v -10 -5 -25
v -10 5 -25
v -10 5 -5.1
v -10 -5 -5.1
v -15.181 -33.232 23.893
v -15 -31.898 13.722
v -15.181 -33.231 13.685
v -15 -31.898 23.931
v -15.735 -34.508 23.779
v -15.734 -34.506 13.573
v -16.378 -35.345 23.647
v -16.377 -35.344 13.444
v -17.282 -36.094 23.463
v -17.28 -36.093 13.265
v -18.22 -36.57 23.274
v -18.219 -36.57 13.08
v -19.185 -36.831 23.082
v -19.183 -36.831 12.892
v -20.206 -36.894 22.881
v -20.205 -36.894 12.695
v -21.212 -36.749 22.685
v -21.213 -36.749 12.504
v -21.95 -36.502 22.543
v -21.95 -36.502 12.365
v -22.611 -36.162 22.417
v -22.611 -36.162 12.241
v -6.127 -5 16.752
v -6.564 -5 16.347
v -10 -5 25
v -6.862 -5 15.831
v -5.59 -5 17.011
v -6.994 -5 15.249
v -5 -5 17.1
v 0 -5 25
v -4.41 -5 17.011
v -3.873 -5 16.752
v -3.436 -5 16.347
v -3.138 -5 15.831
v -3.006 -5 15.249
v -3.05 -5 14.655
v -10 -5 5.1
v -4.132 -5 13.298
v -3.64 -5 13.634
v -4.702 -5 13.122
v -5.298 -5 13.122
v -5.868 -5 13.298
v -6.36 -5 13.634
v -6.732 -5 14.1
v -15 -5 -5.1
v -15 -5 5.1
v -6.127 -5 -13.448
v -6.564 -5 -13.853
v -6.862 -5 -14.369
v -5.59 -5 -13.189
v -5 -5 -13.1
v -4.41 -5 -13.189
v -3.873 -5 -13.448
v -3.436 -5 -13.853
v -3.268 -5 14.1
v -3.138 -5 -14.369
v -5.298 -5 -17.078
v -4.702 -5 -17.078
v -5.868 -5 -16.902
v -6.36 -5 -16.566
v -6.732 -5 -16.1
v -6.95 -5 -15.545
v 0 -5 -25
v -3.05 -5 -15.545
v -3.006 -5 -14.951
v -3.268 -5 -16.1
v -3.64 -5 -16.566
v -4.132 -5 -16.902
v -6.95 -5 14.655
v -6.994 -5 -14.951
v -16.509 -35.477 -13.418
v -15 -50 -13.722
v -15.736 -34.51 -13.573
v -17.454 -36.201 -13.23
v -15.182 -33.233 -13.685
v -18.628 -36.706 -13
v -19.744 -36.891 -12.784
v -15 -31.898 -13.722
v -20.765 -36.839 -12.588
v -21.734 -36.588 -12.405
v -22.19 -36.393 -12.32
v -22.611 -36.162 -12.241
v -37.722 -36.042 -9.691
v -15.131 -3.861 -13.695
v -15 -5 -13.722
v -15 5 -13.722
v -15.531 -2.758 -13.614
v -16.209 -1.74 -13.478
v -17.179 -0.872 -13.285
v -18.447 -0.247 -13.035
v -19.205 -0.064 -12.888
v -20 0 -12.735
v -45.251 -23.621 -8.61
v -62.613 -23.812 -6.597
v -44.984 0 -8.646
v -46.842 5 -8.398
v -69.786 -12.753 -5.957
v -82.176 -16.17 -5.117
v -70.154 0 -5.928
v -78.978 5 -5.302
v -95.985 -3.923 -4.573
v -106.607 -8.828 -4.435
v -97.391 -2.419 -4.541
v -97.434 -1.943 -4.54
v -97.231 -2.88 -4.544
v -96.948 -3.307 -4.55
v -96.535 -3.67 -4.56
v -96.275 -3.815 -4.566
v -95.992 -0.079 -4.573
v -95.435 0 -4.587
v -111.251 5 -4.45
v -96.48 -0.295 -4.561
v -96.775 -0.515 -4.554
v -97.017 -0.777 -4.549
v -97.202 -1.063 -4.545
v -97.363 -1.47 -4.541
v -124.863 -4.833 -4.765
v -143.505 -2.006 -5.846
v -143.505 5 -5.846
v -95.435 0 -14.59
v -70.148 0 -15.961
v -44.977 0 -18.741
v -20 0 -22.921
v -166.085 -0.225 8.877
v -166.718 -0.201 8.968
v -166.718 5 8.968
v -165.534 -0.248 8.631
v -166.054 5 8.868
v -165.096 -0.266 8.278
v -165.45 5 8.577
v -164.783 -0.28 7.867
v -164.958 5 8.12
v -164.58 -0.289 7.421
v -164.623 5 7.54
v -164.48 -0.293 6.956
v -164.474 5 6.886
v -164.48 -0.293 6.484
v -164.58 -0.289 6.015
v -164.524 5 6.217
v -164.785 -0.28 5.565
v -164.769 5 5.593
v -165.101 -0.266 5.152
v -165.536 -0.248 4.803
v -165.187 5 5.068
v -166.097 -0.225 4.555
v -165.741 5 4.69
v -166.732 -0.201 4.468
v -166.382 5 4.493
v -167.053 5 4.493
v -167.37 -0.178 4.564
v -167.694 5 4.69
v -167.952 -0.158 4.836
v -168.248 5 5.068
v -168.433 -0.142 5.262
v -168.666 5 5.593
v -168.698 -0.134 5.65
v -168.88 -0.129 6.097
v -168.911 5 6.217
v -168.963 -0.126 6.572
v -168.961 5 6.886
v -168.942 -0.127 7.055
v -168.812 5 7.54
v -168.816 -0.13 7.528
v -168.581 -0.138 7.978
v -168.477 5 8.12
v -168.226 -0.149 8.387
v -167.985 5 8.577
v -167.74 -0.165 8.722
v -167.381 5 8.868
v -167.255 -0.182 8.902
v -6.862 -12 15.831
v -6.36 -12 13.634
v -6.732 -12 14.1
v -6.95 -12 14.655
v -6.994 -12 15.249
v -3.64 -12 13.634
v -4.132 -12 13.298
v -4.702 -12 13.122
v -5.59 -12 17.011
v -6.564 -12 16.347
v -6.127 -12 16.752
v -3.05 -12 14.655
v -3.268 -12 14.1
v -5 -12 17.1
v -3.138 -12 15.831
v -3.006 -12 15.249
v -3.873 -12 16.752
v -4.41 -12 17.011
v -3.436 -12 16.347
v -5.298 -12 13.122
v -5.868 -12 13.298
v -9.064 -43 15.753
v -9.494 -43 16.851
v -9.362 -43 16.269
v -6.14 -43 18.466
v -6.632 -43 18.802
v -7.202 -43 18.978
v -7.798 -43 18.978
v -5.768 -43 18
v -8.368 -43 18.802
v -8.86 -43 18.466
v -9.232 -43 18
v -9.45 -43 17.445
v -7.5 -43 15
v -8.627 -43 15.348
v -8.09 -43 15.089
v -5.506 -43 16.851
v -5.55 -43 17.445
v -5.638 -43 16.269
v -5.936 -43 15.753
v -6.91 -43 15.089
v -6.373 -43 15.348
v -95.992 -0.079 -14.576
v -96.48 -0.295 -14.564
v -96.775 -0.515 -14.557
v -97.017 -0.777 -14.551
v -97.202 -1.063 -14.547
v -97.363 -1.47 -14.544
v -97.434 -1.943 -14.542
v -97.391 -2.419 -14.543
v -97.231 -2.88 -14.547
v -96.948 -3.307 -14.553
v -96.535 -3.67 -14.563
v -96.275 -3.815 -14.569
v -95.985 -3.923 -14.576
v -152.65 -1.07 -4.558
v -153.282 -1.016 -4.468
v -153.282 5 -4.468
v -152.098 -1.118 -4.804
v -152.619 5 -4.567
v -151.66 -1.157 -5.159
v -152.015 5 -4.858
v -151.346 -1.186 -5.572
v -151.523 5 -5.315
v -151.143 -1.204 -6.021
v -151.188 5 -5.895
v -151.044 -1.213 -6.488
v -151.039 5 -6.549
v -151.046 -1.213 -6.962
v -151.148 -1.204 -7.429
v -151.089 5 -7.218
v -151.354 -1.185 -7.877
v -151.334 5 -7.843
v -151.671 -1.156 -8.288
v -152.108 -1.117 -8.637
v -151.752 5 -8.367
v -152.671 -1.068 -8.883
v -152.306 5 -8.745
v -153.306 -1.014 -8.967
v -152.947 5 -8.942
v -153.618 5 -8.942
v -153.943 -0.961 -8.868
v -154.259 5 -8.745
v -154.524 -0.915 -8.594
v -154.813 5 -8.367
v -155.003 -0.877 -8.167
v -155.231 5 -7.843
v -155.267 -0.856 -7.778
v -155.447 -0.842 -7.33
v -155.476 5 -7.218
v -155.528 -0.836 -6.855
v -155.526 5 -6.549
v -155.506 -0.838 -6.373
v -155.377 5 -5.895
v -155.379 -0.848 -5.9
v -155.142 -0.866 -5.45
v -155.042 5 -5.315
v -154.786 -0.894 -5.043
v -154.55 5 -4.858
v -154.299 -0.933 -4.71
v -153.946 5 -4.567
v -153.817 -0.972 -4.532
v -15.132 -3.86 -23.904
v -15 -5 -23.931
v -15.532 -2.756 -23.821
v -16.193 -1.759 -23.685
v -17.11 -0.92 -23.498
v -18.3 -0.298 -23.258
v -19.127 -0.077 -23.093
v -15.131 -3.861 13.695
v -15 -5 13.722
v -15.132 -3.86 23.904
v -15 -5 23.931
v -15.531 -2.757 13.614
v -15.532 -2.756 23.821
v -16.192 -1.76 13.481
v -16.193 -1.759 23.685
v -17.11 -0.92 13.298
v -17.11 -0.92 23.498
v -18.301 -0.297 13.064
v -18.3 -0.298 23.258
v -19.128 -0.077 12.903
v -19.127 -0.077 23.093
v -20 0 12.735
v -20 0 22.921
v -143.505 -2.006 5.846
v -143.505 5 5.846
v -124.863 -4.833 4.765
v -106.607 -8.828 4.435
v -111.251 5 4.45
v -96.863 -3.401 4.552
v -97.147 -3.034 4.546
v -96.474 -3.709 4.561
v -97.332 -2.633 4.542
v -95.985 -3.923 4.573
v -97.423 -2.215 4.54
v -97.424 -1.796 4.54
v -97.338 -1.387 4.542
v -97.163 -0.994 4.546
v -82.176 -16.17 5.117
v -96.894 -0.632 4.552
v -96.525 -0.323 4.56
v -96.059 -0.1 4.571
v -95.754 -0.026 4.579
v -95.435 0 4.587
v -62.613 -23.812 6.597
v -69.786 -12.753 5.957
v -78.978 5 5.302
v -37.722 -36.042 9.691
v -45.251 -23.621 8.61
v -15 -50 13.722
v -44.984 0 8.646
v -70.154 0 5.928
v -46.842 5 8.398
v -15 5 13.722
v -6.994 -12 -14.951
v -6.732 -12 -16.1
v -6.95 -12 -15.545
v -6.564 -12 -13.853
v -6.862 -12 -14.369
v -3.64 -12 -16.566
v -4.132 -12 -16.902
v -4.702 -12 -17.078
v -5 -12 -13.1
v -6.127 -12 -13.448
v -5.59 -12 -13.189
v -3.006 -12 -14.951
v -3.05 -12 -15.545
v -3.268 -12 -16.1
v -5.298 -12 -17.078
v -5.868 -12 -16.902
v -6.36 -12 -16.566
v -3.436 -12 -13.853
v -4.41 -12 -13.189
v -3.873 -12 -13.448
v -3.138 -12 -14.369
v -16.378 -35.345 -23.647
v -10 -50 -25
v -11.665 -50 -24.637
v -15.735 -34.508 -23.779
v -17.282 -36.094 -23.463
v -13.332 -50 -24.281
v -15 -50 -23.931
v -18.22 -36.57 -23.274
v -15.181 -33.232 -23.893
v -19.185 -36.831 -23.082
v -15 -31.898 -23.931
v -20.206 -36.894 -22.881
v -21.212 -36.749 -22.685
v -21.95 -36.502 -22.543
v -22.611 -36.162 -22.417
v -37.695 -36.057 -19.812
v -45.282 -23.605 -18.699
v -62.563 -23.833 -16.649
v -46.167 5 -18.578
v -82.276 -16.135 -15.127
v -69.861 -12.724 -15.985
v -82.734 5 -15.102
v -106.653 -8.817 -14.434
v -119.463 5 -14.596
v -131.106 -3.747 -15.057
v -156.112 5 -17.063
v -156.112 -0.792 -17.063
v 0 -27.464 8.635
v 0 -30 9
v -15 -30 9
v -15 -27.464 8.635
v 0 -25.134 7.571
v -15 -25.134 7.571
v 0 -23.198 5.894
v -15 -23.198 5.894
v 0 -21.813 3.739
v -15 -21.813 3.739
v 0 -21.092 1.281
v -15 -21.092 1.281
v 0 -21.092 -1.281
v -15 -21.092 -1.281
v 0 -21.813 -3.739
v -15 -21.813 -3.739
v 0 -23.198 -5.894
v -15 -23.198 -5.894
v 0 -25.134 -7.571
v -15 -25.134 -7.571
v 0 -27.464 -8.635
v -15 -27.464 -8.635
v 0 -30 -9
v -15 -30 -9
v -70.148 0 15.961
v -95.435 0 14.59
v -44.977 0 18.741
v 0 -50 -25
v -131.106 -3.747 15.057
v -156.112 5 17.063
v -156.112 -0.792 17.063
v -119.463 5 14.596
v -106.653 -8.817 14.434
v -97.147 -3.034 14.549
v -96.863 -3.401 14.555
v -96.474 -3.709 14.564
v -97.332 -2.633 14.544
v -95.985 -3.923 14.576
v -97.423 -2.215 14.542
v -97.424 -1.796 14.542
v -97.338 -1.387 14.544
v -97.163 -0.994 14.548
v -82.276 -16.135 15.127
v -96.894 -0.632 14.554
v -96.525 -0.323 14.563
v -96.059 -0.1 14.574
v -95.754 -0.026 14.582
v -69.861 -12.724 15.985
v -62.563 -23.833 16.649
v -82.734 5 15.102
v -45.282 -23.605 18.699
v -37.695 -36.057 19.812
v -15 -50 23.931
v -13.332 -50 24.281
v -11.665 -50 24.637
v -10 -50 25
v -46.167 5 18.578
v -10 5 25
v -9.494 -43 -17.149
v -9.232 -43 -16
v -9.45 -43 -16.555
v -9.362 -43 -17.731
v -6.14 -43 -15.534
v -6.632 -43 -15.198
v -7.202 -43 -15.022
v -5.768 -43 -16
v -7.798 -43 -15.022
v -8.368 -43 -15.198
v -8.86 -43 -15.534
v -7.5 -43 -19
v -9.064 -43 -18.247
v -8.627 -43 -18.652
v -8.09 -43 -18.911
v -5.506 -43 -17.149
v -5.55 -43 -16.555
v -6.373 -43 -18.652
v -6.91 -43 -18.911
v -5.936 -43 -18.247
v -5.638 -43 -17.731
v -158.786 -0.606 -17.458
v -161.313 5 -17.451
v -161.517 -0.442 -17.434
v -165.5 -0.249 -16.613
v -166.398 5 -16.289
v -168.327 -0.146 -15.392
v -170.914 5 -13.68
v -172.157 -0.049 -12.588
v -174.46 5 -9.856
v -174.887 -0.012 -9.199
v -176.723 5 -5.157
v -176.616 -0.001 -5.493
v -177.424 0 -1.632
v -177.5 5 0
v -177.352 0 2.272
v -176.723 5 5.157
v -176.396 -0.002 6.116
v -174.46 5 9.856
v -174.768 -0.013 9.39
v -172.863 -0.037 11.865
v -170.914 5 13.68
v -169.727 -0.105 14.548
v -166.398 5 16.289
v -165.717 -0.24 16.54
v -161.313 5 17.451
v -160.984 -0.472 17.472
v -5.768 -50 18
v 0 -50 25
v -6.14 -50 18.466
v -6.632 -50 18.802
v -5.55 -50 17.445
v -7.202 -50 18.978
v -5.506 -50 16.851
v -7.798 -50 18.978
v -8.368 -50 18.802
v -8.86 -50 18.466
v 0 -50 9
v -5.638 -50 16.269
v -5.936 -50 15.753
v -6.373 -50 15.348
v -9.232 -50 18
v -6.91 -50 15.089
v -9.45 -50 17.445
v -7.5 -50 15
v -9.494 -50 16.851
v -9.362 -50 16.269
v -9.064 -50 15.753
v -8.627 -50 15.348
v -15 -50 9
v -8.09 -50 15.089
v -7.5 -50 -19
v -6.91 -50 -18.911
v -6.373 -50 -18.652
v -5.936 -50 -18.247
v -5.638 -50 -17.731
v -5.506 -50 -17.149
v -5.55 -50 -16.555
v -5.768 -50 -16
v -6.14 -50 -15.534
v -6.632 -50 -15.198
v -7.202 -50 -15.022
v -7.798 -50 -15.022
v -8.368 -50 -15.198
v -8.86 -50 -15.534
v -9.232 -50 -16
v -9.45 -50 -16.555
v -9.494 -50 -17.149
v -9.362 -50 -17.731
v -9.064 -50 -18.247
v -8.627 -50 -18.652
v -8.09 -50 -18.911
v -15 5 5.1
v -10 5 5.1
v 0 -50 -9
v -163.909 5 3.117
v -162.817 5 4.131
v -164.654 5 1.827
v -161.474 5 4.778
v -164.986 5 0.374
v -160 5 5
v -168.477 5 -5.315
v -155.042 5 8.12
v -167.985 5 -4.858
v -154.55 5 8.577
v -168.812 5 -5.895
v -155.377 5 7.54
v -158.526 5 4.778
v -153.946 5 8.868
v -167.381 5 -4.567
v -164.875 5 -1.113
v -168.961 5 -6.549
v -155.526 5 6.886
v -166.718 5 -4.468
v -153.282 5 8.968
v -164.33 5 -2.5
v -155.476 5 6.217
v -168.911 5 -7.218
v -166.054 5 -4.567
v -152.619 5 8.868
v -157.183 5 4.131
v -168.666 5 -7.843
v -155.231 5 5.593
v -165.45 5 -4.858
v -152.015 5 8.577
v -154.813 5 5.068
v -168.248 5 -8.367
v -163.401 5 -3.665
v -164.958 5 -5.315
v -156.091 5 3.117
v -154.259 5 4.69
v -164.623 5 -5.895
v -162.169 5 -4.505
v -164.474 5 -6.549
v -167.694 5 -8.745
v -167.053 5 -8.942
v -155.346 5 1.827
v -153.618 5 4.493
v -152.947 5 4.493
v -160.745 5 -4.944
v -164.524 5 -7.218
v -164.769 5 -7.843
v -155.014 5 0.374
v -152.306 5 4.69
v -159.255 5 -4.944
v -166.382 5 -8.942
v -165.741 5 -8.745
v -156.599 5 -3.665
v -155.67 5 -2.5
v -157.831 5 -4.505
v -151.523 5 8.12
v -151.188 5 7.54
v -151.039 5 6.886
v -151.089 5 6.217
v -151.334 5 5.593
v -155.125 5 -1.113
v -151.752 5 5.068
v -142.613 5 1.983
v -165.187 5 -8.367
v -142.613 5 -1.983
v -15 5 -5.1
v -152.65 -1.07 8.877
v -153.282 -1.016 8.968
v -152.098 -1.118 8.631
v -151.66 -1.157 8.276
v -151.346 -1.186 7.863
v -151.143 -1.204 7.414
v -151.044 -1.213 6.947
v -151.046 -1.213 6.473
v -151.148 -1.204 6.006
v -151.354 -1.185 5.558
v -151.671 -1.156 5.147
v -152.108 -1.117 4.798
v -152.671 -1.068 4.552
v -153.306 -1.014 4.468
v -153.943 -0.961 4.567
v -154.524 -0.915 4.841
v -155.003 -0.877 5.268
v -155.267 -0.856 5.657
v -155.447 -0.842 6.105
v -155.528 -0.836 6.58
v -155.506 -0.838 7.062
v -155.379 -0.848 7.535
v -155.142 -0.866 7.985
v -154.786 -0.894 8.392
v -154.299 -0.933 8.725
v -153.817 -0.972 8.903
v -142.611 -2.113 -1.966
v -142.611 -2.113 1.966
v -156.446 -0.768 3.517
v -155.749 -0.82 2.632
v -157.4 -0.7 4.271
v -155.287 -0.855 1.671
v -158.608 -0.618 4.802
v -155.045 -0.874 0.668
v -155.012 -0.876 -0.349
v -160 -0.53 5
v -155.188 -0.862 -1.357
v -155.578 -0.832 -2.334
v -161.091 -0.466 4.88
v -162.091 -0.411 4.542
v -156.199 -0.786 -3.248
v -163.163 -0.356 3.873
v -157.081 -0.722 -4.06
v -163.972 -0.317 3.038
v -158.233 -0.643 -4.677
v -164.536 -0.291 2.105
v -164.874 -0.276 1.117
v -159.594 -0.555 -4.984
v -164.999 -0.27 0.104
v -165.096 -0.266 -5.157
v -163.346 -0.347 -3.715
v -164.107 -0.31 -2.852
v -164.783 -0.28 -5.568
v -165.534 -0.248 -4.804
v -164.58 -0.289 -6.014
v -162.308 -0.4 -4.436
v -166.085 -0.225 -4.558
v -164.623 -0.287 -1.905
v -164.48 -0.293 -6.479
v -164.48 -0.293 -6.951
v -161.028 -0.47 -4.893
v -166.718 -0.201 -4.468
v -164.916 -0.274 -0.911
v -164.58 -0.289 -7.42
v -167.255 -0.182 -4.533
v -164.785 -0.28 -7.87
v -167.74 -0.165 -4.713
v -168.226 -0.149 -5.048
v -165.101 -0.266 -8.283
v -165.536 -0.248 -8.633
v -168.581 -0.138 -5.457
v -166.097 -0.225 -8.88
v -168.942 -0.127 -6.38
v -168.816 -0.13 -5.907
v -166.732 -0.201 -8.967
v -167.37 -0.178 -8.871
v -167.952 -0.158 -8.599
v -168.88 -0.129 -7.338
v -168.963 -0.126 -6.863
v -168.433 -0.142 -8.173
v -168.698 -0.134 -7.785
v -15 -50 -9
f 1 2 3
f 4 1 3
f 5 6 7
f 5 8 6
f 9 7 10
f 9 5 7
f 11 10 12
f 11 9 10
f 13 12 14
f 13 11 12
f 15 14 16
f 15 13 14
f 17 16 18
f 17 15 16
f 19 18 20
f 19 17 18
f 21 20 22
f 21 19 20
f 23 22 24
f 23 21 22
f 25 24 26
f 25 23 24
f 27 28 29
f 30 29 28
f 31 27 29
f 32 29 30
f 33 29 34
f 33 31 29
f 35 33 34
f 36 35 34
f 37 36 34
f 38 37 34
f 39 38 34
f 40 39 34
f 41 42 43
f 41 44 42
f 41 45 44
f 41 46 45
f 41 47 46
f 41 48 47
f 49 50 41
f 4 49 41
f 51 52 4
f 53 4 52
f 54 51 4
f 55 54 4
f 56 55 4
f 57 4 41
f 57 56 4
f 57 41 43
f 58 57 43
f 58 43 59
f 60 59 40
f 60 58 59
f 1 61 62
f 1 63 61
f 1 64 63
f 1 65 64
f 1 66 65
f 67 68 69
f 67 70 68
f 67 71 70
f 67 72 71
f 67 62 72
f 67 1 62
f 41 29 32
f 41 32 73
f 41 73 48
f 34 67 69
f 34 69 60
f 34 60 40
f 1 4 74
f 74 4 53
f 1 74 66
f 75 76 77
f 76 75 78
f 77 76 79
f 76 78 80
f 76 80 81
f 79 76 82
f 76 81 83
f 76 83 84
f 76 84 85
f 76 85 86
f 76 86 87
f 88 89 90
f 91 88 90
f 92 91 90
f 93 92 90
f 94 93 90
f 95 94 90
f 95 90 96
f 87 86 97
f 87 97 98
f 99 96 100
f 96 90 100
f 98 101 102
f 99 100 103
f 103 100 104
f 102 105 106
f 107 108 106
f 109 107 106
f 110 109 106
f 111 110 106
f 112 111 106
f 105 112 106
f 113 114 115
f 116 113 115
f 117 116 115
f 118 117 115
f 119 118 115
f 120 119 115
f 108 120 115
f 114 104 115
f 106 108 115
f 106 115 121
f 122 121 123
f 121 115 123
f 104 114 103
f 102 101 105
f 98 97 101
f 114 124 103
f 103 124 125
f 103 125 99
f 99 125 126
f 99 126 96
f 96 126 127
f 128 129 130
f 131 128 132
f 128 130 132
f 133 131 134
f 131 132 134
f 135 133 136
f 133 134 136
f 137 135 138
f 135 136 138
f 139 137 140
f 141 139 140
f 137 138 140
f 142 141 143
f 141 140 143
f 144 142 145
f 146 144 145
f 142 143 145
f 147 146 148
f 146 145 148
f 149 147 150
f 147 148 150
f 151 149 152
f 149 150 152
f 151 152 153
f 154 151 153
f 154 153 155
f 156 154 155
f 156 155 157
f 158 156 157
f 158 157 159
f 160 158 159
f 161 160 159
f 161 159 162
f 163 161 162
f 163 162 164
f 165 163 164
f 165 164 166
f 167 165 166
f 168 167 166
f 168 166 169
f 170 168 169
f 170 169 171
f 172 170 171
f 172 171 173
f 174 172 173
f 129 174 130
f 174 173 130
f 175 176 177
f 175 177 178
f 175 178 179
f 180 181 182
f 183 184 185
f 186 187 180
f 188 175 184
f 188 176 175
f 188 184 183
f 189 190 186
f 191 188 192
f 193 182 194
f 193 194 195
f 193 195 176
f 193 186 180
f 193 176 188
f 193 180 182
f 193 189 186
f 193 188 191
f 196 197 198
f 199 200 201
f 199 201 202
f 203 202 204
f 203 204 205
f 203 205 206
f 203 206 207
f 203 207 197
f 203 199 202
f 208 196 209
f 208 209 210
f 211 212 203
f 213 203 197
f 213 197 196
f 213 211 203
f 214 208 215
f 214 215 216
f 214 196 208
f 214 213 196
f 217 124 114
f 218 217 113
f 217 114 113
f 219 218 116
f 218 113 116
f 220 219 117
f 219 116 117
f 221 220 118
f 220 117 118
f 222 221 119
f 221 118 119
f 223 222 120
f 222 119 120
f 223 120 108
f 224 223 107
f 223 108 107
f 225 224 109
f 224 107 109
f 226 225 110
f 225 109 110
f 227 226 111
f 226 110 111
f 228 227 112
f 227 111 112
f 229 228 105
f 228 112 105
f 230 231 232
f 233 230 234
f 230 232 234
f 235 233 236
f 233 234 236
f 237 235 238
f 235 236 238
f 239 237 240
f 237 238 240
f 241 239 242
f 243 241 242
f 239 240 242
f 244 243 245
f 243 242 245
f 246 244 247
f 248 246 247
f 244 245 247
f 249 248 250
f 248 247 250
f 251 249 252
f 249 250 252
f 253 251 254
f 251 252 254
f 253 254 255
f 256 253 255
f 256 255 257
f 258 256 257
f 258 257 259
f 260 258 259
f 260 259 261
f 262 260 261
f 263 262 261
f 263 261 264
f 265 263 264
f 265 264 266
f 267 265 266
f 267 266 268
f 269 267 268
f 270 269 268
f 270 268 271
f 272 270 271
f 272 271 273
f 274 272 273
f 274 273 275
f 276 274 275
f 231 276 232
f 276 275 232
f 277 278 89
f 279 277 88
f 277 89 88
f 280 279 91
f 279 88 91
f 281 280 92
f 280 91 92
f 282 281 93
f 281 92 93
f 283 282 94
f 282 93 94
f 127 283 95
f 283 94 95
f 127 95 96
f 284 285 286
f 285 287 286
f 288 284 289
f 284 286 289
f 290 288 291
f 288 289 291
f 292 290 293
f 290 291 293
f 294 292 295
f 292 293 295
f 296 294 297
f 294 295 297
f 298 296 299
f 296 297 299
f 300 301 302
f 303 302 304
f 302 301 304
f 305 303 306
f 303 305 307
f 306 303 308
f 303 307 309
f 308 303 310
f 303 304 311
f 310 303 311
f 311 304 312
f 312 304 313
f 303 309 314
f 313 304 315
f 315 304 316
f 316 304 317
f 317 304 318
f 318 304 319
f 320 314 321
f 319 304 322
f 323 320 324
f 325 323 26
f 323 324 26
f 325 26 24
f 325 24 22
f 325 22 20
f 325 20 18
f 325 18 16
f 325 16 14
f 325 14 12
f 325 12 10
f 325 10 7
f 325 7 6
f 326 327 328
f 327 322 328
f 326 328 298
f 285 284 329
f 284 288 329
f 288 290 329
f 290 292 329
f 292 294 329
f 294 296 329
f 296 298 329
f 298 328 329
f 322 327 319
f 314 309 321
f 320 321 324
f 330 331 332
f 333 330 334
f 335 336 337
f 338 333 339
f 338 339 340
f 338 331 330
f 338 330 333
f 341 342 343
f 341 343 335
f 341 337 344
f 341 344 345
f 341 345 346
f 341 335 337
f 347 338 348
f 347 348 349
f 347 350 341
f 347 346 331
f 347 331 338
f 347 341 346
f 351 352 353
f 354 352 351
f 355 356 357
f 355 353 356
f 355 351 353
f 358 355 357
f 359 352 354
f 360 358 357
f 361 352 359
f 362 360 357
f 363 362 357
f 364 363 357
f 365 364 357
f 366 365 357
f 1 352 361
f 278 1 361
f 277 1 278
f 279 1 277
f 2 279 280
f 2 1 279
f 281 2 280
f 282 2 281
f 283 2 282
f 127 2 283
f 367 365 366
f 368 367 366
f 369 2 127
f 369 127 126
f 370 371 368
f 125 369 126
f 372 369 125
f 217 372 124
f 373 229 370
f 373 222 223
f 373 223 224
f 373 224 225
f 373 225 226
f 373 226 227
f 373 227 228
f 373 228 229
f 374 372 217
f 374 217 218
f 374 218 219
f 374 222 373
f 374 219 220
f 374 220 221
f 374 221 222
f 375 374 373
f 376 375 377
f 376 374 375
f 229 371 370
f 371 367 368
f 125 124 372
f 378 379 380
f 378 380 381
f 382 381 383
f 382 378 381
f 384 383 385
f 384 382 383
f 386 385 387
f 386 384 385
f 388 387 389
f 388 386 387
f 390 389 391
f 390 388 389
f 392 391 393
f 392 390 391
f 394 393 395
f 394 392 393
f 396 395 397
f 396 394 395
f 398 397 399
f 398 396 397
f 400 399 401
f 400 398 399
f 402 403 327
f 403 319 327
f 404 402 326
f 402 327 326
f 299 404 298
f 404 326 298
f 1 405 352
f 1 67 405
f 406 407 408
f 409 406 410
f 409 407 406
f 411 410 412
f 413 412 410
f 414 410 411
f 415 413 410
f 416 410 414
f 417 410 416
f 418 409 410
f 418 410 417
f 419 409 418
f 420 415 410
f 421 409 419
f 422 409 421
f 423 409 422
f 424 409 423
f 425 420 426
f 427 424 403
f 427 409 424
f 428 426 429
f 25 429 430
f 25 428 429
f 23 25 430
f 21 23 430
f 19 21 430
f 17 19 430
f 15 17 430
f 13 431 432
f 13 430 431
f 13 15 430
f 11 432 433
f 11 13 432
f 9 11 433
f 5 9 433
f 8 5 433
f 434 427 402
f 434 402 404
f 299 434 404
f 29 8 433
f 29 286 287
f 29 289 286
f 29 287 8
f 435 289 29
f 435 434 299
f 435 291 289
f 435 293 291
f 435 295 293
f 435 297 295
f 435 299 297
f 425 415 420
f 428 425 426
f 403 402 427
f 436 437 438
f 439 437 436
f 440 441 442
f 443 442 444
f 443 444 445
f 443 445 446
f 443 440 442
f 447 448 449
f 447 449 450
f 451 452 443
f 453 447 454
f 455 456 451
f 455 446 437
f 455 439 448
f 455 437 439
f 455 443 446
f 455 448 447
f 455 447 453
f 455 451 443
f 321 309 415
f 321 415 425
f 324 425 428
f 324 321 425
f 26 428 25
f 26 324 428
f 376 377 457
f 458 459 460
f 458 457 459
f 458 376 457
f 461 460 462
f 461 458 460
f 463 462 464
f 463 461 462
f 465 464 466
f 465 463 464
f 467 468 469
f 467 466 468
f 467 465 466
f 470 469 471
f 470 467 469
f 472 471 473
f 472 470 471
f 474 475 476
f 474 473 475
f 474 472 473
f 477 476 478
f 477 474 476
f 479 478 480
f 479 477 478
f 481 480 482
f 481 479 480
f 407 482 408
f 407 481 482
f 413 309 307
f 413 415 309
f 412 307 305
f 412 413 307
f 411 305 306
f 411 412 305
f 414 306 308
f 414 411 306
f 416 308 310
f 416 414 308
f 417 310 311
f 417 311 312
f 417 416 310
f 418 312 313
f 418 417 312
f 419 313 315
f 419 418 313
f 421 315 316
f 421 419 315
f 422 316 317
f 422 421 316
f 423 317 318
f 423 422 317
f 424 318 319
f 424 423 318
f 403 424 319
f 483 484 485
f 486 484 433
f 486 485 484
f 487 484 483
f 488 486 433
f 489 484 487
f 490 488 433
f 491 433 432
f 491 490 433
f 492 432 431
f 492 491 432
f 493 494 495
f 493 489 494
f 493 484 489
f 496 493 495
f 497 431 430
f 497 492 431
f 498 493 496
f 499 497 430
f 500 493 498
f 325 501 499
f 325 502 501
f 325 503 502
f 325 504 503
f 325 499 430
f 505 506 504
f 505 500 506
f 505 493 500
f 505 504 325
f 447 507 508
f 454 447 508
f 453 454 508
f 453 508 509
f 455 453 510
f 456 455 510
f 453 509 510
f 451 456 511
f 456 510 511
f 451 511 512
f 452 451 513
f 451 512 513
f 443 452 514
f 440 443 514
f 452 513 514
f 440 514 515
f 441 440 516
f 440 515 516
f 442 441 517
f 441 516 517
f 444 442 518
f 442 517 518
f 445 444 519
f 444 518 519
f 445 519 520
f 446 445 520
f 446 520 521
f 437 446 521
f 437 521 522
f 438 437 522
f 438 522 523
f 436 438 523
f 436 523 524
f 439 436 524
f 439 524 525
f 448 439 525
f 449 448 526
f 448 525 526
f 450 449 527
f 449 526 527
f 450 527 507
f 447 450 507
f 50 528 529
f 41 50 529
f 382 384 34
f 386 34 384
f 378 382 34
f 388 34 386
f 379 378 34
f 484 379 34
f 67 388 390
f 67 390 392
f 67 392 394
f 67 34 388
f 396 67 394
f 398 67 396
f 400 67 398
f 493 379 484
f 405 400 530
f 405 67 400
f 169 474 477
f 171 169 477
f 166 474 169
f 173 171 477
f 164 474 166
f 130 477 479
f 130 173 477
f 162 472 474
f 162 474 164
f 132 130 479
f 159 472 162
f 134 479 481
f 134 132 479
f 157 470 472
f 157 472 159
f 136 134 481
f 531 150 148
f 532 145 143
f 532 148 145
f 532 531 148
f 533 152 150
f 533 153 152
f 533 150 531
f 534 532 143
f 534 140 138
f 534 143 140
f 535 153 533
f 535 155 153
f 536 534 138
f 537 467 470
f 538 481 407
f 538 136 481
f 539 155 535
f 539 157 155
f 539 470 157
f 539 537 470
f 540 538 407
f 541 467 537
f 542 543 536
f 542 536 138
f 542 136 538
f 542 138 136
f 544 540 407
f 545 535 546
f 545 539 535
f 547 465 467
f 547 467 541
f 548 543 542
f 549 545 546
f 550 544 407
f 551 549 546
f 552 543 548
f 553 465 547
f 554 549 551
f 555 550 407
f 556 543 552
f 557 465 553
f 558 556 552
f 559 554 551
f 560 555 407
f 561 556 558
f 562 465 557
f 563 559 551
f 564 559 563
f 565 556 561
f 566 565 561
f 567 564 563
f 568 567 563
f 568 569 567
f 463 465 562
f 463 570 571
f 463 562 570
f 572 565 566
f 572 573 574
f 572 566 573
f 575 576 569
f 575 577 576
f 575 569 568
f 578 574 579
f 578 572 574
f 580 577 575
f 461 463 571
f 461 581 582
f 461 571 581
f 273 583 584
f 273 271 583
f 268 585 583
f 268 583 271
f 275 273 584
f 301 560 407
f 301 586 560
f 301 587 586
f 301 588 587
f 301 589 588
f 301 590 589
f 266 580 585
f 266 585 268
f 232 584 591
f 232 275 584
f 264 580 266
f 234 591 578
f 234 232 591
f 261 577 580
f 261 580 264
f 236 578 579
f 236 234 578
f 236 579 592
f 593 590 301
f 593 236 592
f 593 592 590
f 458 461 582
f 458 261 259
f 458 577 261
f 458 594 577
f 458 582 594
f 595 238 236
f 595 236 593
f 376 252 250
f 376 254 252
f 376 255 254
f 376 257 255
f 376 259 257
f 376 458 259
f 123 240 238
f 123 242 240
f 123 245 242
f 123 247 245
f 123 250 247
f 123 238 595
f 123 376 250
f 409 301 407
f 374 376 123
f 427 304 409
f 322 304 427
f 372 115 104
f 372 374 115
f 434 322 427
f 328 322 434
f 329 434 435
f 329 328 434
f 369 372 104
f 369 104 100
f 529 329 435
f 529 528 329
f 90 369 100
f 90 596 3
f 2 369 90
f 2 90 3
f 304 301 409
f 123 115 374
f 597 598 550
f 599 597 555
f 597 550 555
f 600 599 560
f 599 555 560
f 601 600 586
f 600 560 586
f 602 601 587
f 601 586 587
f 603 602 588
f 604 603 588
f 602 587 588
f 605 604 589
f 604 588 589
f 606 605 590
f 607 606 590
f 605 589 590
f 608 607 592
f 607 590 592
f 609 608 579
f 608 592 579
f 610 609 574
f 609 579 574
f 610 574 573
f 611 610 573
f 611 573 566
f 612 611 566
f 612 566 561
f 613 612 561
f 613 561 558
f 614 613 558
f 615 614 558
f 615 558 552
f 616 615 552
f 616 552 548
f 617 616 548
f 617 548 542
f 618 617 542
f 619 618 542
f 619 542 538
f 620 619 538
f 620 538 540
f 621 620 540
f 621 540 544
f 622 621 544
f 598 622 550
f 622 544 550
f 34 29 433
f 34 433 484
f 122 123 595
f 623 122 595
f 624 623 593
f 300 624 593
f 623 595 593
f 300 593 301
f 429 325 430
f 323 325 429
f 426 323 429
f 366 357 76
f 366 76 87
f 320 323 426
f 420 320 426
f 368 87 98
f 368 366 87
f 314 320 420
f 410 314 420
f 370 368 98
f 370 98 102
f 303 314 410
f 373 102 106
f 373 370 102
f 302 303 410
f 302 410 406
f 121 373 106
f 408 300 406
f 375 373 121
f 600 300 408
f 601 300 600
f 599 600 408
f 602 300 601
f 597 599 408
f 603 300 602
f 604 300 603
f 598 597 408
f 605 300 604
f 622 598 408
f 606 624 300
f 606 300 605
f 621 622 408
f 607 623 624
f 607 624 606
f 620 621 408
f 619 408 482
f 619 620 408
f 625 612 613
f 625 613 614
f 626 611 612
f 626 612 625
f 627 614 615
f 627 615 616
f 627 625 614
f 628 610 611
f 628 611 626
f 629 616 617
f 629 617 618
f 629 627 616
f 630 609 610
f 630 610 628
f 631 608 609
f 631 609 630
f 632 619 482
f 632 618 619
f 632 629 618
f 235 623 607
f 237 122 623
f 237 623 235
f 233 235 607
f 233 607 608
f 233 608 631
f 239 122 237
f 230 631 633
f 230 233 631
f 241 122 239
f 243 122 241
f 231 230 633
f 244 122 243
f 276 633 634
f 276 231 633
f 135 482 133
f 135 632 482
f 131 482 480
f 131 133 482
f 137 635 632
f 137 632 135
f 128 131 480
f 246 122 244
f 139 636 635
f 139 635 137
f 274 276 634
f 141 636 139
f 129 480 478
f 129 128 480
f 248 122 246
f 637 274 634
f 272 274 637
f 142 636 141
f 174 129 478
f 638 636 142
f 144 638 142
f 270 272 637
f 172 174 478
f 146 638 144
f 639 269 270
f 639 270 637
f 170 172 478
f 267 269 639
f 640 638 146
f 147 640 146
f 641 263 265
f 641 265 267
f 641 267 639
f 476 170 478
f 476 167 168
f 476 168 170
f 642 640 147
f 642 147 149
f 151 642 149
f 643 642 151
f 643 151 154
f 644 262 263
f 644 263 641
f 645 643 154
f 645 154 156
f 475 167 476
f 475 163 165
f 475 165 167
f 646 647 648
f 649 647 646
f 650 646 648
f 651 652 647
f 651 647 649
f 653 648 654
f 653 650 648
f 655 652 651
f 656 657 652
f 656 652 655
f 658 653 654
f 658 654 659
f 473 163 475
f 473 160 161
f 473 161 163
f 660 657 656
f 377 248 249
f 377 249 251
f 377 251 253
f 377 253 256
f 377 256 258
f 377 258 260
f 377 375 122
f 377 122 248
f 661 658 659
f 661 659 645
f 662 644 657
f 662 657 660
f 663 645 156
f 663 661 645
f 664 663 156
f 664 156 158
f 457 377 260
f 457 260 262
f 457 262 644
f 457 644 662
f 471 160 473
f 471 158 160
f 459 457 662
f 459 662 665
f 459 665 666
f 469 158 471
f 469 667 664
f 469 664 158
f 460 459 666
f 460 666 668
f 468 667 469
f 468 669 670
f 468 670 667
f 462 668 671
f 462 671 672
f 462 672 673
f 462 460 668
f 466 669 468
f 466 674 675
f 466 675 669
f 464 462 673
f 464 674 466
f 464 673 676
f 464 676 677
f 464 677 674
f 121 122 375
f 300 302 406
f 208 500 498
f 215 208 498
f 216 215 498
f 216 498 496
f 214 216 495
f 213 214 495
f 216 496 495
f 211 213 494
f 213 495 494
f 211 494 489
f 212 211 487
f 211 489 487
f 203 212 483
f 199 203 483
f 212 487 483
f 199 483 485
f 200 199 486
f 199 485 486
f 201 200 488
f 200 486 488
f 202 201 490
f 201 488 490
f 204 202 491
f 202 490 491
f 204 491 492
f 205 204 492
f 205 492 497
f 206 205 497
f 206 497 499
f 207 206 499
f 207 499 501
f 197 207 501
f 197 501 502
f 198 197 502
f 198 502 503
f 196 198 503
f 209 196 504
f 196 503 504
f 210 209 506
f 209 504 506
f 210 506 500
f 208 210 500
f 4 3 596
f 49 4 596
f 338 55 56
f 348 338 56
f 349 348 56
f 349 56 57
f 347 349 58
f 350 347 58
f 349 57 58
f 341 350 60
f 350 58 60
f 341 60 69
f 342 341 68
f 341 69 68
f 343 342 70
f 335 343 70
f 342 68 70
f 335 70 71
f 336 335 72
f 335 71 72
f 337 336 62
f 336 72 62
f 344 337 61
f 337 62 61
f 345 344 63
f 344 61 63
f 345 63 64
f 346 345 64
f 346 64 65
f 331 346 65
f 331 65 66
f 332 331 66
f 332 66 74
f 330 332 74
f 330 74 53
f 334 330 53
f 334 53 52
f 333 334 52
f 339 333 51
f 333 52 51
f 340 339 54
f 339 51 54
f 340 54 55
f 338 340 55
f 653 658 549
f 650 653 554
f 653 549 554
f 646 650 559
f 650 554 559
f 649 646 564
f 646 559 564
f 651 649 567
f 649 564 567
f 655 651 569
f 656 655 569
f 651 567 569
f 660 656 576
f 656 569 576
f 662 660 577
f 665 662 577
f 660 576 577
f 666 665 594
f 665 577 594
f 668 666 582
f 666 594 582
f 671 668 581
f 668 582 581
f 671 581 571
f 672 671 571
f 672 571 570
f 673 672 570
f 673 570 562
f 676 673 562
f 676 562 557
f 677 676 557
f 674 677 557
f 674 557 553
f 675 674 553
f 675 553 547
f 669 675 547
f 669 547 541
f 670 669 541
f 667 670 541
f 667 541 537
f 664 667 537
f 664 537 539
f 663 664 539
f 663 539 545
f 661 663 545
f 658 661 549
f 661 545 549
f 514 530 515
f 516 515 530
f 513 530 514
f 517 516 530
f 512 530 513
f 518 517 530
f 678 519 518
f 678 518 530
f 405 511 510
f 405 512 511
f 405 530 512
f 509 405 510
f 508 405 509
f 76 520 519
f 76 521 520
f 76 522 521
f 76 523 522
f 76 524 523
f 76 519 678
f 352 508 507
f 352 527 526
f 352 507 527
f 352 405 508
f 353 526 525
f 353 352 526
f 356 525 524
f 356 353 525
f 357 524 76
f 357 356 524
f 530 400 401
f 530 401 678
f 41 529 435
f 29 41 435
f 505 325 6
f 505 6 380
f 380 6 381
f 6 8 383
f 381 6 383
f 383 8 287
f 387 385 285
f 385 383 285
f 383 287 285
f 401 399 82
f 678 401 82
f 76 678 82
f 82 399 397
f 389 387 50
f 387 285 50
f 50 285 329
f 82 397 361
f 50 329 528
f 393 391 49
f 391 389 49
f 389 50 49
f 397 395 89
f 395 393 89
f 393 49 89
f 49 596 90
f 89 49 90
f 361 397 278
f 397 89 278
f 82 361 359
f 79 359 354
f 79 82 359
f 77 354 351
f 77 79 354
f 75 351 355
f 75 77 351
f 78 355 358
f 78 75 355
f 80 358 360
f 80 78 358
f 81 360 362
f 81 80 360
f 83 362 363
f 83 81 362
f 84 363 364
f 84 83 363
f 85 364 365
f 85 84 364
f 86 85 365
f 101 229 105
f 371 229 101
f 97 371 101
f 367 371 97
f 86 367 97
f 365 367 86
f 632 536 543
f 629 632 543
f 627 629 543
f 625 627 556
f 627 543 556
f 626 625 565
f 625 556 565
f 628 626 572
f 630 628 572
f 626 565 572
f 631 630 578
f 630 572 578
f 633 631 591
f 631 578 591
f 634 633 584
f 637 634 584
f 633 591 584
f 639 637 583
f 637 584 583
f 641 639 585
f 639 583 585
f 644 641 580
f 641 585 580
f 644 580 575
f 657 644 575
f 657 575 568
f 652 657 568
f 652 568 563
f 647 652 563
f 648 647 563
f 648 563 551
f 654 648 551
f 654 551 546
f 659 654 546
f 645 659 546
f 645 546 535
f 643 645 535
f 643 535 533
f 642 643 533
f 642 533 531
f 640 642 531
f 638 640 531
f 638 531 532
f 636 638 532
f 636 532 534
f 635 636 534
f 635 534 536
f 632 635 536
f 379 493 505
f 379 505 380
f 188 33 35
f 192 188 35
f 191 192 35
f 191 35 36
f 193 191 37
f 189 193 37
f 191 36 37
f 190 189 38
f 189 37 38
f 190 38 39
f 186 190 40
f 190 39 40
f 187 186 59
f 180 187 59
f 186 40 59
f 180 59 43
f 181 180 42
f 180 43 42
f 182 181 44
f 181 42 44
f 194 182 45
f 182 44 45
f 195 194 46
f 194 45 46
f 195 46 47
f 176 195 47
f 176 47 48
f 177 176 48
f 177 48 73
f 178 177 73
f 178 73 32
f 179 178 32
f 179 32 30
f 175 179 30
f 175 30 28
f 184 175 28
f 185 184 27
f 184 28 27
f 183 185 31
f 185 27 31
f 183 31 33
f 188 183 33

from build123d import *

# Parameters (mm, degrees)
BASE_DEPTH             = 5
SUPPORT_DEPTH          = 30
SUPPORT_DEPTH_BACK     = 30
ESQUISSE7_OUTSIDE_W    = 218.554
ESQUISSE7_OUTSIDE_H    = 101.054
AJUSTEMENT_DEPTH       = 187.832143915
TROU_CENTRE_DEPTH      = 188.500000137
ESQUISSE11_R           = 2.25
ESQUISSE11_R_2         = 5
TROU_MOTEUR_DEPTH      = 188.500000137
CONG_2_R               = 5
CONG_3_R               = 2
TROU_SUPPORT_DEPTH     = 10
ESQUISSE13_R           = 2
INSERT_HAUT_DEPTH      = 7
PONT_REACH             = 188.095
PONT_DIRECTION_2_DEPTH = 187.094734075
ESQUISSE14_R           = 2
INSERT_BAS_DEPTH       = 7


with BuildPart() as part:
    # Esquisse2 → Base (new body)
    with BuildSketch(Plane(origin=(0, 0, 0), x_dir=(1, 0, 0), z_dir=(0, 1, 0))):
        with BuildLine():
            ThreePointArc((-10, 25), (-82.734029234, 15.101895807), (-156.112273553, 17.062695657))
            ThreePointArc((-156.112273553, 17.062695657), (-177.5, 0), (-156.112273553, -17.062695657))
            ThreePointArc((-156.112273553, -17.062695657), (-82.734029234, -15.101895807), (-10, -25))
            Line((-10, -25), (0, -25))
            Line((0, -25), (0, 25))
            Line((0, 25), (-10, 25))
        make_face()
    extrude(amount=BASE_DEPTH)

    # Esquisse6 → Support (add, two sides: drawn at the far end of the back side and taken through both)
    with BuildSketch(Plane.XY.offset(-SUPPORT_DEPTH_BACK)):
        with BuildLine():
            Line((0, 0), (0, -50))
            Line((0, -50), (-15, -50))
            ThreePointArc((-15, -50), (-92.49080932, -12.782630291), (-177.5, 0))
            Line((-177.5, 0), (-111.226419291, 0))
            ThreePointArc((-111.226419291, 0), (-61.29219157, -16.216276522), (-15, -40.983749587))
            Line((-15, -40.983749587), (-15, 0))
            Line((-15, 0), (0, 0))
        make_face()
    extrude(amount=SUPPORT_DEPTH + SUPPORT_DEPTH_BACK)

    # Esquisse7 outside → Ajustement (cut, through all)
    with BuildSketch(Plane(origin=(0, 0, 0), x_dir=(1, 0, 0), z_dir=(0, 1, 0))):
        with Locations((-88.75, 0)):
            Rectangle(ESQUISSE7_OUTSIDE_W, ESQUISSE7_OUTSIDE_H)
        with BuildLine():
            Line((-10, -25), (0, -25))
            Line((0, -25), (0, 25))
            Line((0, 25), (-10, 25))
            ThreePointArc((-10, 25), (-82.734029234, 15.101895807), (-156.112273553, 17.062695657))
            ThreePointArc((-156.112273553, 17.062695657), (-177.5, 0), (-156.112273553, -17.062695657))
            ThreePointArc((-156.112273553, -17.062695657), (-82.734029234, -15.101895807), (-10, -25))
        make_face(mode=Mode.SUBTRACT)
    extrude(amount=-AJUSTEMENT_DEPTH, mode=Mode.SUBTRACT)

    # Esquisse9 → Trou_centre (cut, through all)
    with BuildSketch(Plane(origin=(0, 5, 0), x_dir=(1, 0, 0), z_dir=(0, 1, 0))):
        with BuildLine():
            Line((-15, -13.722068475), (-15, 13.722068475))
            ThreePointArc((-15, 13.722068475), (-78.978011617, 5.302380383), (-143.505381198, 5.846156906))
            ThreePointArc((-143.505381198, 5.846156906), (-142.5, 0), (-143.505381198, -5.846156906))
            ThreePointArc((-143.505381198, -5.846156906), (-78.978011617, -5.302380383), (-15, -13.722068475))
        make_face()
    extrude(amount=-TROU_CENTRE_DEPTH, mode=Mode.SUBTRACT)

    # Esquisse11 → Trou_moteur (cut, through all)
    with BuildSketch(Plane(origin=(0, 5, 0), x_dir=(1, 0, 0), z_dir=(0, 1, 0))):
        with Locations(Location((-153.282485579, 6.717514421, 0), (0, 0, 270))):
            Circle(ESQUISSE11_R)
        with Locations(Location((-153.282485579, -6.717514421, 0), (0, 0, 270))):
            Circle(ESQUISSE11_R)
        with Locations(Location((-166.717514421, -6.717514421, 0), (0, 0, 270))):
            Circle(ESQUISSE11_R)
        with Locations(Location((-166.717514421, 6.717514421, 0), (0, 0, 270))):
            Circle(ESQUISSE11_R)
        with Locations(Location((-160, 0, 0), (0, 0, 270))):
            Circle(ESQUISSE11_R_2)
    extrude(amount=-TROU_MOTEUR_DEPTH, mode=Mode.SUBTRACT)

    # Congé2
    cong_2_edges = [part.edges().sort_by_distance(p)[0] for p in [
        (-15, -40.983749587, 18.826594184),
        (-15, -40.983749587, -18.826594184),
        (-15, 0, -18.826594184),
        (-15, 0, 18.826594184),
    ]]
    fillet(cong_2_edges, radius=CONG_2_R)

    # Congé3
    cong_3_edges = [part.edges().sort_by_distance(p)[0] for p in [
        (-111.226419291, 0, -9.45038232),
        (-111.226419291, 0, 9.45038232),
    ]]
    fillet(cong_3_edges, radius=CONG_3_R)

    # Esquisse12 → Trou_support (cut)
    with BuildSketch(Plane(origin=(0, 5, 0), x_dir=(1, 0, 0), z_dir=(0, 1, 0))):
        Polygon((-15, -5.1), (-10, -5.1), (-10, -25), (0, -25), (0, 25), (-10, 25), (-10, 5.1), (-15, 5.1), align=None)
    extrude(amount=-TROU_SUPPORT_DEPTH, mode=Mode.SUBTRACT)

    # Esquisse13 → Insert_haut (cut)
    with BuildSketch(Plane(origin=(0, -5, 0), x_dir=(1, 0, 0), z_dir=(0, 1, 0))):
        with Locations(Location((-5, -15.1, 0), (0, 0, 270))):
            Circle(ESQUISSE13_R)
        with Locations(Location((-5, 15.1, 0), (0, 0, 270))):
            Circle(ESQUISSE13_R)
    extrude(amount=-INSERT_HAUT_DEPTH, mode=Mode.SUBTRACT)

    # Esquisse15 → Pont (cut, up to next)
    with BuildSketch(Plane(origin=(0, 0, 0), x_dir=(0, 0, -1), z_dir=(1, 0, 0)), mode=Mode.PRIVATE) as pont_sk1:
        with BuildLine():
            Line((-9, -50), (-9, -30))
            ThreePointArc((-9, -30), (0, -21), (9, -30))
            Line((9, -30), (9, -50))
            Line((9, -50), (-9, -50))
        make_face()
    pont_tool1 = extrude(pont_sk1.sketch, amount=-PONT_REACH, mode=Mode.PRIVATE) & part.part
    add(pont_tool1.solids().sort_by_distance((0, -36.391173, 0))[0], mode=Mode.SUBTRACT)

    # Esquisse15 → Pont direction 2 (cut)
    with BuildSketch(Plane(origin=(0, 0, 0), x_dir=(0, 0, -1), z_dir=(1, 0, 0))):
        with BuildLine():
            Line((-9, -50), (-9, -30))
            ThreePointArc((-9, -30), (0, -21), (9, -30))
            Line((9, -30), (9, -50))
            Line((9, -50), (-9, -50))
        make_face()
    extrude(amount=PONT_DIRECTION_2_DEPTH, mode=Mode.SUBTRACT)

    # Esquisse14 → Insert_bas (cut)
    with BuildSketch(Plane.XZ.offset(50)):
        with Locations(Location((-7.5, 17, 0), (0, 0, 270))):
            Circle(ESQUISSE14_R)
        with Locations(Location((-7.5, -17, 0), (0, 0, 270))):
            Circle(ESQUISSE14_R)
    extrude(amount=-INSERT_BAS_DEPTH, mode=Mode.SUBTRACT)


solid = part.part
